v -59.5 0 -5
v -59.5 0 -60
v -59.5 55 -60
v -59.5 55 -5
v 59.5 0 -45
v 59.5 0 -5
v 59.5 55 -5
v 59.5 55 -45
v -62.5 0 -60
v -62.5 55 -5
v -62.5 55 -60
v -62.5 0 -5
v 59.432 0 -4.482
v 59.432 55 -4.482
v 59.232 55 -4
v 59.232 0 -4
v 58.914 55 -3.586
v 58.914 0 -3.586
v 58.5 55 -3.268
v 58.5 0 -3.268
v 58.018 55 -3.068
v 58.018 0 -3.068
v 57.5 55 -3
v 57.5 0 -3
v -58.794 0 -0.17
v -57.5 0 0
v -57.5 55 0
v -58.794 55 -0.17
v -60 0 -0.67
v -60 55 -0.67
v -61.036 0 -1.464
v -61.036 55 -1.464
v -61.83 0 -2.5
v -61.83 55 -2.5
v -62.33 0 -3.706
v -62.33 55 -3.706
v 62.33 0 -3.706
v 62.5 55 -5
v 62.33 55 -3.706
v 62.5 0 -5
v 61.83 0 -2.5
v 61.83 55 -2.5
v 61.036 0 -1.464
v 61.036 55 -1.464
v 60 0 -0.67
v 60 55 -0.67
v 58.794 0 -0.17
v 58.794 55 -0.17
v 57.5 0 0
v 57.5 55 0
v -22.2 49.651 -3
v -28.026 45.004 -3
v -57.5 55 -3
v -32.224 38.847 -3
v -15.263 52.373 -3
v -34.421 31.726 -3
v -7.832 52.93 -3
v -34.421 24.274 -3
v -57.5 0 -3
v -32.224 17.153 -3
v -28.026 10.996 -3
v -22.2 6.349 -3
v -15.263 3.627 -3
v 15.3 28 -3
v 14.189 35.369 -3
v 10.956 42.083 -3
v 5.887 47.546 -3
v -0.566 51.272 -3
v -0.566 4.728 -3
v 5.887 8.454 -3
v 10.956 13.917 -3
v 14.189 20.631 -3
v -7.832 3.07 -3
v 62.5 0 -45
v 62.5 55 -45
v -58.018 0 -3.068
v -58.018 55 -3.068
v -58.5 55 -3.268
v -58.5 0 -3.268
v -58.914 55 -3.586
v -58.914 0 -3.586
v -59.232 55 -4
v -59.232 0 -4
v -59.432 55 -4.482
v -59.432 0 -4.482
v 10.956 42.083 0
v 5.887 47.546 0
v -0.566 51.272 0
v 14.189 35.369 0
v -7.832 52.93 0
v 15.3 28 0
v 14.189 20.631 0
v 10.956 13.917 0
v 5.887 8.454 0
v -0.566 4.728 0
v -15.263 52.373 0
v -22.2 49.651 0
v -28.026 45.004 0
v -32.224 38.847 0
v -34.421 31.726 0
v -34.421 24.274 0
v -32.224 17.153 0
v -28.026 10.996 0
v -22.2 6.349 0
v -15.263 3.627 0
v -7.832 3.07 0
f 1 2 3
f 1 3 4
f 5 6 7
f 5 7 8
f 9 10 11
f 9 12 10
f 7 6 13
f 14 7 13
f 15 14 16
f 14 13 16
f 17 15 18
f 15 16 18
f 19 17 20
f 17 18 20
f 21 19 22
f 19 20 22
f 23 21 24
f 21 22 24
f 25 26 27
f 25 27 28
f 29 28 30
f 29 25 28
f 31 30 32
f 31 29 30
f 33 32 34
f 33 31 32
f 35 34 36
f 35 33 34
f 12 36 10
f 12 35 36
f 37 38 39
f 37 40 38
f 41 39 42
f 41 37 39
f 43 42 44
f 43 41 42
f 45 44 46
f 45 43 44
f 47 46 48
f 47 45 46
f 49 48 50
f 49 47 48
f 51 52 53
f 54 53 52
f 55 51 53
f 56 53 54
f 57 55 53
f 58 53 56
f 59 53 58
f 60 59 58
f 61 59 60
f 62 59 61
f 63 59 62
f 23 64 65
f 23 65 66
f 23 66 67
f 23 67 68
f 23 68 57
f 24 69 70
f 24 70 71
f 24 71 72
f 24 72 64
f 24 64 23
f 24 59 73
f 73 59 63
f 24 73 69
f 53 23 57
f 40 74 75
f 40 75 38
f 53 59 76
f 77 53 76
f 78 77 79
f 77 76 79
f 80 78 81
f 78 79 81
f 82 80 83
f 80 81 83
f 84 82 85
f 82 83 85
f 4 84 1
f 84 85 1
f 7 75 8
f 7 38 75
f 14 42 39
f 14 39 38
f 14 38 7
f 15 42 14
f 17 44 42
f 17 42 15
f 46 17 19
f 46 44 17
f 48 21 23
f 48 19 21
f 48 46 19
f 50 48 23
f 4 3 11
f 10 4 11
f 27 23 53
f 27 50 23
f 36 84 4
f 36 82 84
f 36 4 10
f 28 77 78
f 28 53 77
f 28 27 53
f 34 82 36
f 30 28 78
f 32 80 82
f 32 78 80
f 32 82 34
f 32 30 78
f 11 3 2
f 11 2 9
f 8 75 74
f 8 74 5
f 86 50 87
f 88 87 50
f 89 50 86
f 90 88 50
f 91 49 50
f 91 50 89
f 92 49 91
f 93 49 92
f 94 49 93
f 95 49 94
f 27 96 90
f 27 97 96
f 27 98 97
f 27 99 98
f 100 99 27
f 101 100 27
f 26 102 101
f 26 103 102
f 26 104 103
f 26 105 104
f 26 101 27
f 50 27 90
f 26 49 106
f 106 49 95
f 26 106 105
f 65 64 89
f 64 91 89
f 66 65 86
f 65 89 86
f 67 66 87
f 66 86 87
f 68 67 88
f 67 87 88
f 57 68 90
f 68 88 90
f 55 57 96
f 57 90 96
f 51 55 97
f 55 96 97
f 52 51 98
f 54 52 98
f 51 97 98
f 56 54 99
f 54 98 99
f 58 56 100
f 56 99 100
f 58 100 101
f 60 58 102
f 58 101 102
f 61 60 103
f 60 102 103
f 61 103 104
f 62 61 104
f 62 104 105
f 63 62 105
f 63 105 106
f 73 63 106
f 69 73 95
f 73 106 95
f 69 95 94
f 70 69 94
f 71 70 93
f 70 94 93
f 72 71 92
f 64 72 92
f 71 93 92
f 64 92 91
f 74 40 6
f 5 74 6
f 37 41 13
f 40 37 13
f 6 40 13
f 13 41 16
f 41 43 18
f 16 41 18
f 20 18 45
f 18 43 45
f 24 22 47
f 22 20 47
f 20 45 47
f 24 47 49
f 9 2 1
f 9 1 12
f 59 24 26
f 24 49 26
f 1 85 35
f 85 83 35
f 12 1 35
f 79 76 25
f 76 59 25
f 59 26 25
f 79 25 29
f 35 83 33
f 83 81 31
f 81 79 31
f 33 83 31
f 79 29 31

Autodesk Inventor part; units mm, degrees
ref_plane "YZ Plane" through (0, 0, 0) normal (1, 0, 0) x (0, 1, 0)
ref_plane "XZ Plane" through (0, 0, 0) normal (0, 1, 0) x (-1, 0, 0)
ref_plane "XY Plane" through (0, 0, 0) normal (0, 0, 1) x (1, 0, 0)
sketch "Sketch3" plane through (0, 0, 0) normal (0, 1, 0) x (-1, 0, 0)
  line L0 (-57.5, 0) -> (57.5, 0)
  line L1 (62.5, -5) -> (62.5, -60)
  line L2 (-62.5, -45) -> (-62.5, -5)
  arc A0 (-57.5, 0) -> (-62.5, -5) centre (-57.5, -5) ccw
  arc A1 (62.5, -5) -> (57.5, 0) centre (57.5, -5) ccw
  line L3 (59.5, -60) -> (59.5, -5)
  arc A2 (59.5, -5) -> (57.5, -3) centre (57.5, -5) ccw
  line L4 (57.5, -3) -> (-57.5, -3)
  arc A3 (-57.5, -3) -> (-59.5, -5) centre (-57.5, -5) ccw
  line L5 (-59.5, -5) -> (-59.5, -45)
  line L6 (-62.5, -45) -> (-59.5, -45)
  line L7 (59.5, -60) -> (62.5, -60)
  point P0 (0, 0)
  point P1 (0, 0)
  dimension "d8" = 5
  dimension "d9" = 125
  dimension "d11" = 3
  dimension "d12" = 40
  dimension "d22" = 55
extrude "Extrusion3" add sketch "Sketch3" along normal blind 55
sketch "Sketch4" plane through (-57.5, 0, 0) normal (0, 0, 1) x (1, 0, 0)
  line L0 (0, 0) -> (115, 0) projected
  circle A0 centre (47.8, 28) radius 25
  line L1 (120, 0) -> (120, 55) projected
  line L2 (-5, 0) -> (-5, 55) projected
  point P0 (57.5, 0)
  dimension "d15" = 50
  dimension "d17" = 28
  dimension "d21" = 52.8
extrude "Extrusion4" cut sketch "Sketch4" against normal blind 60
properties part number "Beta_V2_BendFront01" material "Aluminum 6061 Black Anodized"
